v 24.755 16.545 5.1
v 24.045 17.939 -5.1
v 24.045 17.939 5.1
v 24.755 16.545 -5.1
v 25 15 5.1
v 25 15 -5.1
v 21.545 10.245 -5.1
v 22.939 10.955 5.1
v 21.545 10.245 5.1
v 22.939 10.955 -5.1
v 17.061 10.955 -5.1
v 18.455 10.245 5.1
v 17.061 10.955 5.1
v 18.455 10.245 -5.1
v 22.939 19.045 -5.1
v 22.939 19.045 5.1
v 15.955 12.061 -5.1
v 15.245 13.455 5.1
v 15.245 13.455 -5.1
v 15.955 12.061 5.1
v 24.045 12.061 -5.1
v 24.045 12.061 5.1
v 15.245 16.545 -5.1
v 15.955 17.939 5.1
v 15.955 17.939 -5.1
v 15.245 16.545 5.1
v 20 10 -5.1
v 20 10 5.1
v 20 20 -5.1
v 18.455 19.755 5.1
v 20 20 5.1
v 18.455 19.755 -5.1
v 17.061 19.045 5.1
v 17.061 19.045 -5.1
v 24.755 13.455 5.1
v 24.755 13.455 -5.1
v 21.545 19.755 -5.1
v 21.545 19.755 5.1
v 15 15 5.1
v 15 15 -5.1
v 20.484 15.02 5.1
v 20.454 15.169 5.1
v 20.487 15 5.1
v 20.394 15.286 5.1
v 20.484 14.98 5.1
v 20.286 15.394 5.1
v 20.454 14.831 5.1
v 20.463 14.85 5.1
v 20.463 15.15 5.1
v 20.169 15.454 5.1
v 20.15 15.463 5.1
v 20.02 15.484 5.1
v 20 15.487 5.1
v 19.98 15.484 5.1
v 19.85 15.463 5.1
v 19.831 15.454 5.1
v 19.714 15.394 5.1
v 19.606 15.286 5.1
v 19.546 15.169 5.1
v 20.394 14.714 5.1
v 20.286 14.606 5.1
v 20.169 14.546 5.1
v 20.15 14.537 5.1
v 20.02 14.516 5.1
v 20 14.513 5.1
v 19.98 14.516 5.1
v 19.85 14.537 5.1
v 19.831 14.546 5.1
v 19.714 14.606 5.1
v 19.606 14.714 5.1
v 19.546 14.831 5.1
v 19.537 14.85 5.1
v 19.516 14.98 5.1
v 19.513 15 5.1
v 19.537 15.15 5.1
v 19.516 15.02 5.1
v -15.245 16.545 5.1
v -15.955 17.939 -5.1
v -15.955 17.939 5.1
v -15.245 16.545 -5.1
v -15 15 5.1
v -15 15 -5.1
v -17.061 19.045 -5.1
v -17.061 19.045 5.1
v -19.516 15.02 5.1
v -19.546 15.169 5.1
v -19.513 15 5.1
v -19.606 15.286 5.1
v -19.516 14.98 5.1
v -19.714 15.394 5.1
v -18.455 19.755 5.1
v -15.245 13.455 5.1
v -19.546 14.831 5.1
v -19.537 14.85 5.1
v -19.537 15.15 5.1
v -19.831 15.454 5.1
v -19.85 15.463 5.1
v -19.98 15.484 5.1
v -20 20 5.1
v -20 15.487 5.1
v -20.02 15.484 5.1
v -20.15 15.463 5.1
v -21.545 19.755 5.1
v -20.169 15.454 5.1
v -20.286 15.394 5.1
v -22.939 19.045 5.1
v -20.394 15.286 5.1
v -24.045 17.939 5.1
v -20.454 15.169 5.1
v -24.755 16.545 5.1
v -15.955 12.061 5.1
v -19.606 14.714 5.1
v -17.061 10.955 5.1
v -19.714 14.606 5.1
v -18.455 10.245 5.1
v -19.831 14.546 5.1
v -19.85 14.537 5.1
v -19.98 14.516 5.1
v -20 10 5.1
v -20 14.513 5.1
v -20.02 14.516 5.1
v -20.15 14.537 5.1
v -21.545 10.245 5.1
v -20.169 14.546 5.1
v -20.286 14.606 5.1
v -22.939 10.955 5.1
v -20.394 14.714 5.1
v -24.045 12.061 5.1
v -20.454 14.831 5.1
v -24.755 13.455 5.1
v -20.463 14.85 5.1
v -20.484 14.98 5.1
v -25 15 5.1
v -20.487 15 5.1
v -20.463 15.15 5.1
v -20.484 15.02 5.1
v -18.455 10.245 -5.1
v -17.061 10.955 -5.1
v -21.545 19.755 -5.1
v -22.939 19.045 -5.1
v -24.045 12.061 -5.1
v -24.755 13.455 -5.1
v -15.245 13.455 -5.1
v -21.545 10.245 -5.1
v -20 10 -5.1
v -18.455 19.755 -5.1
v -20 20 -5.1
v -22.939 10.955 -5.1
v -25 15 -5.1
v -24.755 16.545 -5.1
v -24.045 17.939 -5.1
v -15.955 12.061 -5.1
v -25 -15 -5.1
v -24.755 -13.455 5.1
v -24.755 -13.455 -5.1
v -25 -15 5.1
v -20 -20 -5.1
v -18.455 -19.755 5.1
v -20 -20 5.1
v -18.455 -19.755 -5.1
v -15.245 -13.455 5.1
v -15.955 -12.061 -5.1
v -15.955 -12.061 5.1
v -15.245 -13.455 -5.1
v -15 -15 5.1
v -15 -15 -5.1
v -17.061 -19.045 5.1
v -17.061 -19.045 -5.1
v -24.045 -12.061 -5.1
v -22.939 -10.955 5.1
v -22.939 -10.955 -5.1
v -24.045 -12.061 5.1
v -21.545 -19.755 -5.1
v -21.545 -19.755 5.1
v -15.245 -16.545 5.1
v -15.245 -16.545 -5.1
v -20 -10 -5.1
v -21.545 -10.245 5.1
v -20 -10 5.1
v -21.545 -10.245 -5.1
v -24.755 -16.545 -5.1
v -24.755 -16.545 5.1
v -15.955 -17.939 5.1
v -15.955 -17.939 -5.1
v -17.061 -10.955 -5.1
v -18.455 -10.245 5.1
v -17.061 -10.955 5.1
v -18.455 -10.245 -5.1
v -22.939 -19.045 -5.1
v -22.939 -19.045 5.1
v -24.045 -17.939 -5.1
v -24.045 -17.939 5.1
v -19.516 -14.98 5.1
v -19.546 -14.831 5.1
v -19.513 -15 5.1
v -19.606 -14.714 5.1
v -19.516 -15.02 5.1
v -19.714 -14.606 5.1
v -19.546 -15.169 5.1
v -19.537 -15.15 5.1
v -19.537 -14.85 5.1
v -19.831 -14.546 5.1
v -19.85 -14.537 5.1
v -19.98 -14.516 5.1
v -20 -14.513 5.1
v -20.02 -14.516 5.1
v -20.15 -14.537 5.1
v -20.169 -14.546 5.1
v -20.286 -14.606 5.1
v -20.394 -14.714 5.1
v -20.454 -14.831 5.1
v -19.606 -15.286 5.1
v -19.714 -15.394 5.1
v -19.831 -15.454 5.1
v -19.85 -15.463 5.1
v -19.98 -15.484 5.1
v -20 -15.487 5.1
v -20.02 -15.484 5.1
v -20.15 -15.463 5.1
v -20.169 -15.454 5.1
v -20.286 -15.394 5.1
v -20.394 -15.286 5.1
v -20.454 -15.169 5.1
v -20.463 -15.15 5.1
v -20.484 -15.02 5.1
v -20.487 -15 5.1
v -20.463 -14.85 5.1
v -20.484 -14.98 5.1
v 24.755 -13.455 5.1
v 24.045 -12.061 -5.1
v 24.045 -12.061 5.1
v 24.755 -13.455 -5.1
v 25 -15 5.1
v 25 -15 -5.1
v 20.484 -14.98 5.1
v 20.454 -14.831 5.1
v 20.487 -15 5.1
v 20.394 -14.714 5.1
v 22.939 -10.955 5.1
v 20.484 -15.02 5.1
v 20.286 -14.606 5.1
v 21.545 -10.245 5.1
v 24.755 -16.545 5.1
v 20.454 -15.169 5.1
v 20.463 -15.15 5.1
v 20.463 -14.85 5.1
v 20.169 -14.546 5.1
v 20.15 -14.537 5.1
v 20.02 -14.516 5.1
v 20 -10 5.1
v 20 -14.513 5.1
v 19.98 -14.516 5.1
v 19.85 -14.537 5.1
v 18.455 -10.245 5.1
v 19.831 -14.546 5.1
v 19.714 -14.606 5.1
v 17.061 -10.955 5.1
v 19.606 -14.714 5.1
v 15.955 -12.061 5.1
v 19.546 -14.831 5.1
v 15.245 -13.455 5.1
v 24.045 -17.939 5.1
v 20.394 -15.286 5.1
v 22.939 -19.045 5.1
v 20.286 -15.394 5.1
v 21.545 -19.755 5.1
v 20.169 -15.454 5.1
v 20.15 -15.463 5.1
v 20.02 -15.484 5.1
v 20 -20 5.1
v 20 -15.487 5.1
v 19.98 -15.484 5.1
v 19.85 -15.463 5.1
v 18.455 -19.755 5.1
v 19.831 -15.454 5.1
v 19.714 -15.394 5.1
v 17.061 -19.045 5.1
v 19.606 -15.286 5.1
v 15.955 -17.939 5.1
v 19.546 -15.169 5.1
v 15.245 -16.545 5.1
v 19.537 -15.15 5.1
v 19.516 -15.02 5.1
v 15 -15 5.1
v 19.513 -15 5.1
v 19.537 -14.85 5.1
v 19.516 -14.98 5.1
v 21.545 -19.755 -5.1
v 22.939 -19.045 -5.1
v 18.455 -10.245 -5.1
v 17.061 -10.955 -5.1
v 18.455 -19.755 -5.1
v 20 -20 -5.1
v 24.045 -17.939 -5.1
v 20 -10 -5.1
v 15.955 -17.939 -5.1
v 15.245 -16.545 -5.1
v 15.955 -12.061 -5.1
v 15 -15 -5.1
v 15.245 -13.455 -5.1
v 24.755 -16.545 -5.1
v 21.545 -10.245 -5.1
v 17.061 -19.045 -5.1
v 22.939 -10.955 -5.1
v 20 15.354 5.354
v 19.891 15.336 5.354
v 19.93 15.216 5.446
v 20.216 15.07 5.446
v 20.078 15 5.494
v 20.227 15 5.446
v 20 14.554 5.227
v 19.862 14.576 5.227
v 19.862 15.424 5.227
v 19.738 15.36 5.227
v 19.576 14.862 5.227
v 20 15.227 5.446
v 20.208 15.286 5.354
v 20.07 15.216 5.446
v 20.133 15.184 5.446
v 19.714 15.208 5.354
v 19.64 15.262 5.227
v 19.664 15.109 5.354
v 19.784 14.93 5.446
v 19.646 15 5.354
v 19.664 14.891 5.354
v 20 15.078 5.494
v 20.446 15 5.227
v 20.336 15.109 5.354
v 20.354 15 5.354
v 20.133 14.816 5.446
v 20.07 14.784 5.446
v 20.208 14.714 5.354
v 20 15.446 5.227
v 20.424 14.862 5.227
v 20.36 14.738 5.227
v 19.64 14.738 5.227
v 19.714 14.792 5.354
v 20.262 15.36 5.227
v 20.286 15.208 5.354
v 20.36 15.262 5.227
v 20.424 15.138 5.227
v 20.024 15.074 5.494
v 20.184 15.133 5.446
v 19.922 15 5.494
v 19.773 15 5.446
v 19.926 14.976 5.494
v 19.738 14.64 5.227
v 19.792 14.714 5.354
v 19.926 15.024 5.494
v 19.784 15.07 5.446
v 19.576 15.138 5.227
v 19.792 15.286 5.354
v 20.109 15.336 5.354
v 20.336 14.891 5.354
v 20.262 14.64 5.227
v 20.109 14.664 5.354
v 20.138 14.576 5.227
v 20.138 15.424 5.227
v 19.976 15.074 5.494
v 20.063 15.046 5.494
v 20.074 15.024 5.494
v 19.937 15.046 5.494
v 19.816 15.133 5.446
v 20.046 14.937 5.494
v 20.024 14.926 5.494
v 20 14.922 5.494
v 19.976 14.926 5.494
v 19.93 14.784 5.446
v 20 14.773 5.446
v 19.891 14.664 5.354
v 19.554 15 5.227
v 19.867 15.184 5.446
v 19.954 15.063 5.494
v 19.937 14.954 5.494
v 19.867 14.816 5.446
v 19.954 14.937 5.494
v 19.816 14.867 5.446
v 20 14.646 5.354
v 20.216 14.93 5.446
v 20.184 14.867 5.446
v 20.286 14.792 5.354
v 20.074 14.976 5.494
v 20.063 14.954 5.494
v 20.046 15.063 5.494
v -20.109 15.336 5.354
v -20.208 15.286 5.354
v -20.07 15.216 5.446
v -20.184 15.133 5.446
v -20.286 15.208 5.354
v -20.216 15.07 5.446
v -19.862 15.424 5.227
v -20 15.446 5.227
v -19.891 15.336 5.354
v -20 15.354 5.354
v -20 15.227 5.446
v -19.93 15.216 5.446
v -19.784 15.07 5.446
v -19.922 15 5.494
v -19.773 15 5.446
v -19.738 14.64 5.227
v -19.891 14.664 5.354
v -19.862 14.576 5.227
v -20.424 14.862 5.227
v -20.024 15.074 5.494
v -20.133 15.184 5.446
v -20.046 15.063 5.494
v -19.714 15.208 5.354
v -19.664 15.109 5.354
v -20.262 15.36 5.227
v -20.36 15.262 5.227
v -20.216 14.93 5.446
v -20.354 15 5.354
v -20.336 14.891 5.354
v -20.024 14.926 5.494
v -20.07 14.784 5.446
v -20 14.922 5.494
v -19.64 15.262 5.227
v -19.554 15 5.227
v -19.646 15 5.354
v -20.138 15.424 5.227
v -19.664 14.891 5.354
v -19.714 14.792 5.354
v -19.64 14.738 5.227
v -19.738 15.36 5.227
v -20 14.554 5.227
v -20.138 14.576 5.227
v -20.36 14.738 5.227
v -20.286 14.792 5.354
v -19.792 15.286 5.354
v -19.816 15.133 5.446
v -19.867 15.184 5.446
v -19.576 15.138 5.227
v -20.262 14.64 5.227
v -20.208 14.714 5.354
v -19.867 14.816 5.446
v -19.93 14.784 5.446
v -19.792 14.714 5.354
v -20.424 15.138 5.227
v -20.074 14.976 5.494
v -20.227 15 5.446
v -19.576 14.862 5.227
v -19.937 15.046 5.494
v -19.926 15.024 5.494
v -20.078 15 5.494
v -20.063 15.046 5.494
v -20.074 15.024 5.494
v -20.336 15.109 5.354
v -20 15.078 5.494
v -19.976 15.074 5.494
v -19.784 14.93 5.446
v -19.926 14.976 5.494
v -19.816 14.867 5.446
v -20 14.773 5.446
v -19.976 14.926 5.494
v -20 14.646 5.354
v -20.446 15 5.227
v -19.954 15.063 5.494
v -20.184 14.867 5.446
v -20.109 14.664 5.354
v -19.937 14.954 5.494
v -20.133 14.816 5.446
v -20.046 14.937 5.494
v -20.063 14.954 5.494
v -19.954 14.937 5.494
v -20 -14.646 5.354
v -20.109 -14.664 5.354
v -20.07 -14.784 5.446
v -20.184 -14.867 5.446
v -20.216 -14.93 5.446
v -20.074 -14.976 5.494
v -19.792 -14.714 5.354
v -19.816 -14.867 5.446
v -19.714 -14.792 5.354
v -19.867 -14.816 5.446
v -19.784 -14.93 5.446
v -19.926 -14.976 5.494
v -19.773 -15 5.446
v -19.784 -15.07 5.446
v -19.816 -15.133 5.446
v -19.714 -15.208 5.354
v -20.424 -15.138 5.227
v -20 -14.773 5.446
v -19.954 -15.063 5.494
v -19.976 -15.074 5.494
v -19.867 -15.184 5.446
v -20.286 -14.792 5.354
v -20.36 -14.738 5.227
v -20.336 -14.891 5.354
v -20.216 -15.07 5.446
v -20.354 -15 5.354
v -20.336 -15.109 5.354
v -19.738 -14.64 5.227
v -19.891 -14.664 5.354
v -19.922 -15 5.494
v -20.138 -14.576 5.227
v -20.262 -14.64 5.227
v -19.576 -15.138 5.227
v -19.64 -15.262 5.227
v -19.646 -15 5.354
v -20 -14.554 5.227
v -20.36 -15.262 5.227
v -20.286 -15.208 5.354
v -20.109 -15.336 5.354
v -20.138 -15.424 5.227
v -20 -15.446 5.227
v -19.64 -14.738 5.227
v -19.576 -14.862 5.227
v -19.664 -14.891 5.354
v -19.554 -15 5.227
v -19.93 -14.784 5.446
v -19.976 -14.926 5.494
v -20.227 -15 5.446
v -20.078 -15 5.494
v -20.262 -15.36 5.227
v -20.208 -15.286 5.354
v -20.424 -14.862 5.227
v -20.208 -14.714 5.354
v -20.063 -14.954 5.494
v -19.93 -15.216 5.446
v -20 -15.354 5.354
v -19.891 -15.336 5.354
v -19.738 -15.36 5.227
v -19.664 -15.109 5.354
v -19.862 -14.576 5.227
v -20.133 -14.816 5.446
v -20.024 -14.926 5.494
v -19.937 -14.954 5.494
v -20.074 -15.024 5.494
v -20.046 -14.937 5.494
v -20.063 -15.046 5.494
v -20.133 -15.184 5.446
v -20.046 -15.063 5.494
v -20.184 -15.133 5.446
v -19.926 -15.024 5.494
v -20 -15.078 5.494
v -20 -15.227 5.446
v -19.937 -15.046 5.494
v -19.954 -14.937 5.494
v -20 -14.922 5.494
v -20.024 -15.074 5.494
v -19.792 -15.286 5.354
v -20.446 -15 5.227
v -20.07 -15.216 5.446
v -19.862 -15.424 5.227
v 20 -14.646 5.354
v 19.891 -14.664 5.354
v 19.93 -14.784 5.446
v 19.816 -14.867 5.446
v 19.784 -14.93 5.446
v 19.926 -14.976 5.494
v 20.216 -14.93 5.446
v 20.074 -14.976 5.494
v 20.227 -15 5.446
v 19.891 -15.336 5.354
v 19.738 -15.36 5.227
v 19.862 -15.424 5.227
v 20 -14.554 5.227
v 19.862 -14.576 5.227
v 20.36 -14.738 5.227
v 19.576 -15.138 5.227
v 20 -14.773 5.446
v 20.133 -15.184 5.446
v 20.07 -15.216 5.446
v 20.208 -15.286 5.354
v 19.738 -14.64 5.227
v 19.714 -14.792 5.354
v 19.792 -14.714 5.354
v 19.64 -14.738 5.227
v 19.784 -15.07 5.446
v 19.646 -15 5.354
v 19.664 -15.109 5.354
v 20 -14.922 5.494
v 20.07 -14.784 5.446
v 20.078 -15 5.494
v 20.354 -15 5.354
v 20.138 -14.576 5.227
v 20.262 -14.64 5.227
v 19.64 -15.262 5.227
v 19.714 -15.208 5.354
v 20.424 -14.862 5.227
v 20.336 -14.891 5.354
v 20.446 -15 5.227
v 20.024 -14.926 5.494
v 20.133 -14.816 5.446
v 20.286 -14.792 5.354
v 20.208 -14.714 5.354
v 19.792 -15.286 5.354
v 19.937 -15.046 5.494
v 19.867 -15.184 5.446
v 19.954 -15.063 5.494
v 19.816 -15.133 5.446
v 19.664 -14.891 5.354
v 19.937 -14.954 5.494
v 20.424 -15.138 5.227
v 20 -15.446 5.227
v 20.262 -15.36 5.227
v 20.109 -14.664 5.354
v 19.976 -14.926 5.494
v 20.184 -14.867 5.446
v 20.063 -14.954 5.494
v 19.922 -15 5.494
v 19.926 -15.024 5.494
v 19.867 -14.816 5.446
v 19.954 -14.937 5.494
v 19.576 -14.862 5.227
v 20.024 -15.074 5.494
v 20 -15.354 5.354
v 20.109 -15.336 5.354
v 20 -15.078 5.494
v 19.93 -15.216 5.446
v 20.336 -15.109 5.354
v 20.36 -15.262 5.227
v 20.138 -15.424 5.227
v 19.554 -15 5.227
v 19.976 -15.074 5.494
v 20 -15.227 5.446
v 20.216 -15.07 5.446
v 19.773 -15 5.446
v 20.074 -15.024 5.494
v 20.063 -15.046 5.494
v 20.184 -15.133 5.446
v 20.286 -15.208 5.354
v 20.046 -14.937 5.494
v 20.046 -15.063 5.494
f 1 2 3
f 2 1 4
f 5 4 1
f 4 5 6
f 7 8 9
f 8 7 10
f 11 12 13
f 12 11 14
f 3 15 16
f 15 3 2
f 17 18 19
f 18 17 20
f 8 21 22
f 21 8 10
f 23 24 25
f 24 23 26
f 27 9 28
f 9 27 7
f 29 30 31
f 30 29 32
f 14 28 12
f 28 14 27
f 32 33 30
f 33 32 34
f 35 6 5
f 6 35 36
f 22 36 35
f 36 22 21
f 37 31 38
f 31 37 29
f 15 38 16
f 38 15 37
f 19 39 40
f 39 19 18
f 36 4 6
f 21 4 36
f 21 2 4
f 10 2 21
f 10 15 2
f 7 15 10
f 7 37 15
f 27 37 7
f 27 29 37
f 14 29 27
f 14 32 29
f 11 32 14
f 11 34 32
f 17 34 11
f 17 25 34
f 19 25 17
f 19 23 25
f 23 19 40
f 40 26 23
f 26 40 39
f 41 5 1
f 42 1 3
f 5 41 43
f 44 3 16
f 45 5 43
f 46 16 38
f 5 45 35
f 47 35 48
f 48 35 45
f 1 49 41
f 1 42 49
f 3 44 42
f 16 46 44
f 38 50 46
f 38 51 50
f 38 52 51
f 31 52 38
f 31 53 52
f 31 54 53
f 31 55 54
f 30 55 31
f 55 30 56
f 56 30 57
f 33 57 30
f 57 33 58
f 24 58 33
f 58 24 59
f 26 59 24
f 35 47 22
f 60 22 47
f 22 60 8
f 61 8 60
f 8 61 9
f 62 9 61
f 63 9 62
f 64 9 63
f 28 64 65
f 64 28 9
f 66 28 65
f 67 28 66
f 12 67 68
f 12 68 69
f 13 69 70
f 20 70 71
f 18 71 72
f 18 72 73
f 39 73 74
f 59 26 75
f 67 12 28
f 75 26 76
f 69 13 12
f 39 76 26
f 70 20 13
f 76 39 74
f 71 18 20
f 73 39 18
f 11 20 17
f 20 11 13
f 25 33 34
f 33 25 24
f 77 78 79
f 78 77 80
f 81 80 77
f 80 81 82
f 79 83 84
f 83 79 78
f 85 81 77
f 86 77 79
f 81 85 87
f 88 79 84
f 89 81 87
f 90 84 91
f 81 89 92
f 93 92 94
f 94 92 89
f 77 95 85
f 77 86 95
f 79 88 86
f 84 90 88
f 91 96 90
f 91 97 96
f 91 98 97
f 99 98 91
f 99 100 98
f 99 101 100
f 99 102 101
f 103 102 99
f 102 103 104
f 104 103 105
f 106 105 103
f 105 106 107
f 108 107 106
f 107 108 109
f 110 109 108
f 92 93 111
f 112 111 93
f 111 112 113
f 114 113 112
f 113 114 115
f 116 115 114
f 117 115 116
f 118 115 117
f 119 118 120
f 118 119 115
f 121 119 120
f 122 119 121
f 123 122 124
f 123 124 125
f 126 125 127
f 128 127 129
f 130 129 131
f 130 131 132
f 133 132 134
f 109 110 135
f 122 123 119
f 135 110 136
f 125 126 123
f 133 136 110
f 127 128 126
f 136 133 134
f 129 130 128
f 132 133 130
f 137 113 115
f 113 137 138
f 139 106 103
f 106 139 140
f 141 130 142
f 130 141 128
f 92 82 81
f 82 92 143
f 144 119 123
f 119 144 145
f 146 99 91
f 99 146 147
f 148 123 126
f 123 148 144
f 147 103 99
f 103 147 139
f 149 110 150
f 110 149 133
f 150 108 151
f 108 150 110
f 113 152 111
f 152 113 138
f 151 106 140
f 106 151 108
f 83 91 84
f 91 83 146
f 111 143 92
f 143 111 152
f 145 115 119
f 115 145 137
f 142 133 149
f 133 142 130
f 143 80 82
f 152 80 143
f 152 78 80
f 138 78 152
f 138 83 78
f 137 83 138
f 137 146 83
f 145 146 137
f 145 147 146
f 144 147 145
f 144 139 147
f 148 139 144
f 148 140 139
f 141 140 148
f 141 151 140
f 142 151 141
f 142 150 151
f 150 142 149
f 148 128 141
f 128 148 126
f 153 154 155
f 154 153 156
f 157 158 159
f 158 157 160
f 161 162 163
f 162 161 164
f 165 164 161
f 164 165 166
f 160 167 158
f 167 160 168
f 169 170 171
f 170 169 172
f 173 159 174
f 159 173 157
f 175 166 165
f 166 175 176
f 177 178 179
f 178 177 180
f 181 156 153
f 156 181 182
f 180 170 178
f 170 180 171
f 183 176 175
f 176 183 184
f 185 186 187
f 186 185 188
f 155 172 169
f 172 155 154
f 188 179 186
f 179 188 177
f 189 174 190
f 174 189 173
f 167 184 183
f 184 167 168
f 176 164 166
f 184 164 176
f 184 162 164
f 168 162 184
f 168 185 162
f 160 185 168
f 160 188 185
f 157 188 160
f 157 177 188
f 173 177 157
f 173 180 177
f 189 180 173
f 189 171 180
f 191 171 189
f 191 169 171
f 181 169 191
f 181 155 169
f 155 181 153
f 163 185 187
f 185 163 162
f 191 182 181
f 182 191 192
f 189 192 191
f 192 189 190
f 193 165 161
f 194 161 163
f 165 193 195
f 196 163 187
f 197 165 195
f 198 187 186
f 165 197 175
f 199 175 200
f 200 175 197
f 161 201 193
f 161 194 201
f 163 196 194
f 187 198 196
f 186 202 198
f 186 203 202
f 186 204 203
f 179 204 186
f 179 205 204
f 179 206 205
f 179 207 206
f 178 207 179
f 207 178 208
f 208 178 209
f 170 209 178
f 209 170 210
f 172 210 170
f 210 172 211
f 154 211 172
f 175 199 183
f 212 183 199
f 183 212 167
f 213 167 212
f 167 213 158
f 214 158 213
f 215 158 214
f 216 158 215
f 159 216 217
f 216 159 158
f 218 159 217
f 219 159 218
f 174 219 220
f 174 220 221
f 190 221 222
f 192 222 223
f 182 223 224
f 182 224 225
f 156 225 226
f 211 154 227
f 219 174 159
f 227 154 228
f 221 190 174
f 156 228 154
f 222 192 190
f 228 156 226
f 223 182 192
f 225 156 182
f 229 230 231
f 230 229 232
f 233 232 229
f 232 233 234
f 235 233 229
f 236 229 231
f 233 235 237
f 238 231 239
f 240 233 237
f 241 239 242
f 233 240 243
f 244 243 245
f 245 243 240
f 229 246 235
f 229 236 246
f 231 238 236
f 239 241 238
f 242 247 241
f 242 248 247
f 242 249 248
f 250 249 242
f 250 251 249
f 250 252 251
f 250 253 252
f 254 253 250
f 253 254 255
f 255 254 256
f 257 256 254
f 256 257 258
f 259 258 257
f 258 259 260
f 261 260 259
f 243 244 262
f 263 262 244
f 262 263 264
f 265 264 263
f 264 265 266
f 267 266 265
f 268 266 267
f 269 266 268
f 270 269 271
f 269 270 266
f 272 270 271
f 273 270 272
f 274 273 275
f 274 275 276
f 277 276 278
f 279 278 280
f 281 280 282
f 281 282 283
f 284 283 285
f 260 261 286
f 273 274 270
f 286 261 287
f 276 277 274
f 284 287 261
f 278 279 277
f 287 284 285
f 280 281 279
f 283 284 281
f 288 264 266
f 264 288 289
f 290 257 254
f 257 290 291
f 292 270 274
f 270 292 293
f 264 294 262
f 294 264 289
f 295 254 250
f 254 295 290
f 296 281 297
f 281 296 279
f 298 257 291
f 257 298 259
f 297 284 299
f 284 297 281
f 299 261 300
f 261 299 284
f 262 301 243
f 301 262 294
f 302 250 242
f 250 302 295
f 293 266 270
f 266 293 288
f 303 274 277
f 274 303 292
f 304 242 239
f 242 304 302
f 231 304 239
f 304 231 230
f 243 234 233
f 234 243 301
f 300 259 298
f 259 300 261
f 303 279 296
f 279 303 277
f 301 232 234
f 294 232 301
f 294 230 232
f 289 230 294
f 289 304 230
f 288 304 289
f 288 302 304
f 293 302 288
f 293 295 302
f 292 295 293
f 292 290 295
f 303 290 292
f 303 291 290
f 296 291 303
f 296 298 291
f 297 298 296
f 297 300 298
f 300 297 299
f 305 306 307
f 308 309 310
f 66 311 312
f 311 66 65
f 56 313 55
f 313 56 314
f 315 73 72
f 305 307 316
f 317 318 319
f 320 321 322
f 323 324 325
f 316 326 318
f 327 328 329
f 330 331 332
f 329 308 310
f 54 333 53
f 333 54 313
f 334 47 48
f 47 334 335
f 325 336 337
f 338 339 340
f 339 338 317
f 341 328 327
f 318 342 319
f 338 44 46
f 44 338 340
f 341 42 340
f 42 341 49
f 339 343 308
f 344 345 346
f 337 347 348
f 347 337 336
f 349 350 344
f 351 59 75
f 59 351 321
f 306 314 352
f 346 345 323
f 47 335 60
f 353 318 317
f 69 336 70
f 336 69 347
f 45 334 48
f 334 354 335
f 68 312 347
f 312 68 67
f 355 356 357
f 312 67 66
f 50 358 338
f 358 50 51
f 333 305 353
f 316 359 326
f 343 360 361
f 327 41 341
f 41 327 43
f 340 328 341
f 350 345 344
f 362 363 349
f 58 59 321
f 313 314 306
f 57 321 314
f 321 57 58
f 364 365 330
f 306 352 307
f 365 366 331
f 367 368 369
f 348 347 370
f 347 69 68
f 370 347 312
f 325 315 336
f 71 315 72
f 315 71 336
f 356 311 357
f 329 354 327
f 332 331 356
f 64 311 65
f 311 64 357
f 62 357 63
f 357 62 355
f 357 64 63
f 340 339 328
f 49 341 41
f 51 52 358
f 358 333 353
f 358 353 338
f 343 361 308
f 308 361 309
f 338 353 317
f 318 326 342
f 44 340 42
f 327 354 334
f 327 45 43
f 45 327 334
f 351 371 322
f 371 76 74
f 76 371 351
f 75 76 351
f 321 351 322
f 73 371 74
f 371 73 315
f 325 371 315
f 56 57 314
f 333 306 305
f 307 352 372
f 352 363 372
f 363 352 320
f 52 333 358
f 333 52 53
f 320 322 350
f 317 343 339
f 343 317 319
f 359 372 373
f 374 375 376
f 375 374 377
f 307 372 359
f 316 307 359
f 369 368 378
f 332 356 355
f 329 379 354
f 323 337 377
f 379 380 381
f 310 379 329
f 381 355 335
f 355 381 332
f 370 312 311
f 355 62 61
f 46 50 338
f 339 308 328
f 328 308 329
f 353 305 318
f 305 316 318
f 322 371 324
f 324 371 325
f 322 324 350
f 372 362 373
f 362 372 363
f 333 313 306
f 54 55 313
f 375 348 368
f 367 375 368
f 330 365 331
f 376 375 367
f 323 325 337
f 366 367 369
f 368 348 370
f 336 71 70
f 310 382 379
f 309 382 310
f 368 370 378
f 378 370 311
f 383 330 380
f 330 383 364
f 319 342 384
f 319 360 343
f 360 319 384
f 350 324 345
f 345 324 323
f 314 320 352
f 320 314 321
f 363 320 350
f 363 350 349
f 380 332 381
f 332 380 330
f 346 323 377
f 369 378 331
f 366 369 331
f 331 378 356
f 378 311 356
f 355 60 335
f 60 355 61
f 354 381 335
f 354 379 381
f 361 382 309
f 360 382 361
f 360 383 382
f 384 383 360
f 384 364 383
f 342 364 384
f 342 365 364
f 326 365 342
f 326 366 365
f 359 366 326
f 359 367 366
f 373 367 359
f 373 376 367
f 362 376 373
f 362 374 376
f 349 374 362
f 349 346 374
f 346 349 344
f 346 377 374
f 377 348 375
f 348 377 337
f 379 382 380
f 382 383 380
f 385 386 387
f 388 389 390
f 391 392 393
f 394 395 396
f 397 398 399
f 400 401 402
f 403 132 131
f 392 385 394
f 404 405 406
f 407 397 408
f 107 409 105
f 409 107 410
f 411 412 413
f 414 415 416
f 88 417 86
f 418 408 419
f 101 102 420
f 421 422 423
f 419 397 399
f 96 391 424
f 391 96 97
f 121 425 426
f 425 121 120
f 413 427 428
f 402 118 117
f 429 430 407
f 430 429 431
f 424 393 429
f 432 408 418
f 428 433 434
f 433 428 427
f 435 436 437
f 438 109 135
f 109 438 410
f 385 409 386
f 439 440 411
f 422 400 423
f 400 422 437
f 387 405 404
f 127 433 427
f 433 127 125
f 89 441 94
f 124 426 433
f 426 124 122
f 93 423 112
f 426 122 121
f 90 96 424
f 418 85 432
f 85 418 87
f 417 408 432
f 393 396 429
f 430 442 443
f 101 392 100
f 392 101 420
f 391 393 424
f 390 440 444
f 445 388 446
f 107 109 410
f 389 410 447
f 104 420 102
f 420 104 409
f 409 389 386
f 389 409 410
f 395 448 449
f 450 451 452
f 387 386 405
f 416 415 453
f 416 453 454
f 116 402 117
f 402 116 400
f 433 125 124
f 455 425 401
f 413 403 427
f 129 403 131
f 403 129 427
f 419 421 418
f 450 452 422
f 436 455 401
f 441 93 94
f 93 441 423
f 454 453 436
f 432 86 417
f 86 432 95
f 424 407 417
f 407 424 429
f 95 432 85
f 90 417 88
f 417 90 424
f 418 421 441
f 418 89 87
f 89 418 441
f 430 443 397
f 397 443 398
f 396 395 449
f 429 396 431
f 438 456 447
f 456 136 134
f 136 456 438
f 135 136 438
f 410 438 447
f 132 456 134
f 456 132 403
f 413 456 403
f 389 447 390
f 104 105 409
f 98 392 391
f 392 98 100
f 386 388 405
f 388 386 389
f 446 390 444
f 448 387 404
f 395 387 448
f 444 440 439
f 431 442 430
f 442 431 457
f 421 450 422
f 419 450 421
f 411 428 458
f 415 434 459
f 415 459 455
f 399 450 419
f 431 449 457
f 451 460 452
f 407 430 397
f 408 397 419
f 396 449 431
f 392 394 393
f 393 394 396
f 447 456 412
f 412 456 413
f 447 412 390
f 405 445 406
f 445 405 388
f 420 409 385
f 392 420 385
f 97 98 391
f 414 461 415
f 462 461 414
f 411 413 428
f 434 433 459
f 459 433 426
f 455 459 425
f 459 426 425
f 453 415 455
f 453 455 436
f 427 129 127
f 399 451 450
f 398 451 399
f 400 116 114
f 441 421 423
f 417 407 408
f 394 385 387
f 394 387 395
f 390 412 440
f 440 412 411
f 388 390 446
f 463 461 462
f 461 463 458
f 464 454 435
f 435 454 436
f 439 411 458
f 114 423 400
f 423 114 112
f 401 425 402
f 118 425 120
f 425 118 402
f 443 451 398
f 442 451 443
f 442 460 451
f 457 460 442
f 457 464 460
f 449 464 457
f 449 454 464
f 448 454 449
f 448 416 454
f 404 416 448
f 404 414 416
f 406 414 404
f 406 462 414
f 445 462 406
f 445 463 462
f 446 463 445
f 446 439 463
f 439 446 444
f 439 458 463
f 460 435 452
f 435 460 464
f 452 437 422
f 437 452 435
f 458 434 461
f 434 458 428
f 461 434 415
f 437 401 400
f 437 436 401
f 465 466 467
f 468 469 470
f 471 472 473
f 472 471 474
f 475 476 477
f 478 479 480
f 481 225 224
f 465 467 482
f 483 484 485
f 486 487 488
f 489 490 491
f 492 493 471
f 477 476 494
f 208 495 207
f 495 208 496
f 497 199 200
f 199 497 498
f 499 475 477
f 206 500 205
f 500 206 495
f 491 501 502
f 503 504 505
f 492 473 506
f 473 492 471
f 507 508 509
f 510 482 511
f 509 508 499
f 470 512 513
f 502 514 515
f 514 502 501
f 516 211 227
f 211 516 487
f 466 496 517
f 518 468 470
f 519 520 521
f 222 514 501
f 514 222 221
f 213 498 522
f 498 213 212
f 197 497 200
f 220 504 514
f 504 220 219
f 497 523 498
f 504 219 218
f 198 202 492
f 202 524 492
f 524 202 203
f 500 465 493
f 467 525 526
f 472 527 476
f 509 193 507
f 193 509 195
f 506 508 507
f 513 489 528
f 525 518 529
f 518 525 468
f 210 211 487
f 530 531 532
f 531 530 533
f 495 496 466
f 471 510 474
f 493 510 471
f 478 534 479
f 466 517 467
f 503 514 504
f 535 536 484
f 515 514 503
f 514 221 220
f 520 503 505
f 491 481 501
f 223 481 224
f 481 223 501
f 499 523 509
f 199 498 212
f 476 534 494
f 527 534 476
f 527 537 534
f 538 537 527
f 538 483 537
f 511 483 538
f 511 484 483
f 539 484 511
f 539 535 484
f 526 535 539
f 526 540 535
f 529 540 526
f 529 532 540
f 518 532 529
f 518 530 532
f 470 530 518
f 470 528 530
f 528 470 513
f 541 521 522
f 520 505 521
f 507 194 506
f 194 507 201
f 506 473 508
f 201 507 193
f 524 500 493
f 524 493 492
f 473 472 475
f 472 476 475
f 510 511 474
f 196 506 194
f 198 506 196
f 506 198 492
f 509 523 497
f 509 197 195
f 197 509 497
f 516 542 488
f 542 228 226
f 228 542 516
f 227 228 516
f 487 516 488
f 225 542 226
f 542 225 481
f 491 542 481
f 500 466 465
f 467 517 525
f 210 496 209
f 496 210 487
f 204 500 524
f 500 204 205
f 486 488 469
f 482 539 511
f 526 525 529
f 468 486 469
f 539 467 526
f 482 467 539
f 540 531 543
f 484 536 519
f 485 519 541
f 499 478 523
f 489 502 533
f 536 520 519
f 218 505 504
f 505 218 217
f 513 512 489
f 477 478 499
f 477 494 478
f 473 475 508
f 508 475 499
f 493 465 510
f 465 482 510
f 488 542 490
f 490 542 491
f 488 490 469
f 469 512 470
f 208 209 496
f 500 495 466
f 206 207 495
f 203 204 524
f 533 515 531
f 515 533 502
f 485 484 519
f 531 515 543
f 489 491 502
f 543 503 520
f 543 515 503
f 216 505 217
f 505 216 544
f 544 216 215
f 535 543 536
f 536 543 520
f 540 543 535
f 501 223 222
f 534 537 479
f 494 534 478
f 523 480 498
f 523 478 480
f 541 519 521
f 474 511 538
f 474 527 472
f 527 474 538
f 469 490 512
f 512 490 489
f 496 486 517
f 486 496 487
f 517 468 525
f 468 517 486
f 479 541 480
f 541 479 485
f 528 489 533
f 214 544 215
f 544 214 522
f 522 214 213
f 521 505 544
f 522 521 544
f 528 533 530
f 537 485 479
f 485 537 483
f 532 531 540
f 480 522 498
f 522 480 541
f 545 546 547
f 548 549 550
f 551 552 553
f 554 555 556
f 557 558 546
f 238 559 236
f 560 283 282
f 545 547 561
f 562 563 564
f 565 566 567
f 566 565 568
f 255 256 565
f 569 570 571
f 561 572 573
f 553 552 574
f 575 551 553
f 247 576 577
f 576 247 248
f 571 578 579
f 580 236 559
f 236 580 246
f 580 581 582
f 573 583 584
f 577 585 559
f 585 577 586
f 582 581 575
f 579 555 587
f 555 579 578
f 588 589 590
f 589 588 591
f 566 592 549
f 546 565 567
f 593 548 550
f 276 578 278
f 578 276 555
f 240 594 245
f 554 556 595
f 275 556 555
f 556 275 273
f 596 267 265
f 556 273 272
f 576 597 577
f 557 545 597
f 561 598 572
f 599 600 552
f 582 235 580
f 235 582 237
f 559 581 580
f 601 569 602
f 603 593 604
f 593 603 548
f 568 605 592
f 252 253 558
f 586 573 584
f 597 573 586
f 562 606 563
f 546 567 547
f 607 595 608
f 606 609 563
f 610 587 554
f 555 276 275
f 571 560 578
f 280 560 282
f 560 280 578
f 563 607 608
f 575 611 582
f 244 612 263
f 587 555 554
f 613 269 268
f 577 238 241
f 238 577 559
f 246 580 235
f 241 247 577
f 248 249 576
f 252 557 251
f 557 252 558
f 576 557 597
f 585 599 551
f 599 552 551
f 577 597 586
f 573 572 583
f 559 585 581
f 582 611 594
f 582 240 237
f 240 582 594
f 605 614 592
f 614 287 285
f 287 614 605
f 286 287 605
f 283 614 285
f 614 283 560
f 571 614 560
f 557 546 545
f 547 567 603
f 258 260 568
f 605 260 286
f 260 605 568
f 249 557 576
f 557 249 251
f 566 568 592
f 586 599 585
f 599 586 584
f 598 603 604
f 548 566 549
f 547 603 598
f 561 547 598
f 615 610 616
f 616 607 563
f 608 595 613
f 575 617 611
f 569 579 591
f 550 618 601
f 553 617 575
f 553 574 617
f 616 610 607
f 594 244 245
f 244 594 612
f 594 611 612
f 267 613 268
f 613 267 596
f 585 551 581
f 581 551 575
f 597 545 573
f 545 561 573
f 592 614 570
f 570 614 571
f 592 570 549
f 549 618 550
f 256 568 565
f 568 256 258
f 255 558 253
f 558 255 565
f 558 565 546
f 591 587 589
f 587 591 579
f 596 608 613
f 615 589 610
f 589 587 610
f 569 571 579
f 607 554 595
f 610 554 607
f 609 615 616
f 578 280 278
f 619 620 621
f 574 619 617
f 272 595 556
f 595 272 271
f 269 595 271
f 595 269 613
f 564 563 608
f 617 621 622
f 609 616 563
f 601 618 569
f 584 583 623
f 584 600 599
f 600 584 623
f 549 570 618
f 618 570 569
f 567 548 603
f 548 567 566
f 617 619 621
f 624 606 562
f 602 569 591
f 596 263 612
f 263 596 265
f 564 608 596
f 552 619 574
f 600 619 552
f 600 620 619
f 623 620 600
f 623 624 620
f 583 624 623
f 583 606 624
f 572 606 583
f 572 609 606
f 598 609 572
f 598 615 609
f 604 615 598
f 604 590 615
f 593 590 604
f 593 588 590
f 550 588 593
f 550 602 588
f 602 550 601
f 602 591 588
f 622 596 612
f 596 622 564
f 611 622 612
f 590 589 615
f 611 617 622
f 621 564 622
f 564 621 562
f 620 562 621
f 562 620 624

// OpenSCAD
//-- Parametros de la caja
lx = 50;  //-- Longitud en eje x
ly = 40;  //-- Longitud en eje y
r = 5;    //-- Radio del redondeo de las esquinas
h = 10;   //-- Altura

//-- Coordenadas del cilindro del primer cuadrante
cx = lx/2 - r;
cy = ly/2 - r;

//-- Posicion de los 4 cilindros de las esquinas
P1 = [cx, cy, 0];
P2 = [-cx, cy, 0];
P3 = [-cx, -cy, 0];
P4 = [cx, -cy, 0];


//-- Obtener el menor objeto convexo que contiene
//--   los 4 cilindros
%hull() {
  translate(P1)
    cylinder(r = r, h = h, center = true, $fn = 20);
    
  translate(P2)
    cylinder(r = r, h = h, center = true, $fn = 20);
    
  translate(P3)
    cylinder(r = r, h = h, center = true, $fn = 20);
    
  translate(P4)
    cylinder(r = r, h = h, center = true, $fn = 20);  
}

//-- Mostrar cilindros en amarillo
translate(P1)
    cylinder(r = r, h = h+0.2, center = true, $fn = 20);
    
translate(P2)
    cylinder(r = r, h = h+0.2, center = true, $fn = 20);
    
translate(P3)
    cylinder(r = r, h = h+0.2, center = true, $fn = 20);
    
translate(P4)
    cylinder(r = r, h = h+0.2, center = true, $fn = 20);
    
//-- Mostrar centro de la parte superior de los cilindros
color("red")
translate(P1 + [0,0,h/2])
  sphere(r = 0.5, $fn = 20);
  
  
color("red")
translate(P2 + [0,0,h/2])
  sphere(r = 0.5, $fn = 20); 
  
  
color("red")
translate(P3 + [0,0,h/2])
  sphere(r = 0.5, $fn = 20); 
  
  
color("red")
translate(P4 + [0,0,h/2])
  sphere(r = 0.5, $fn = 20);
  
